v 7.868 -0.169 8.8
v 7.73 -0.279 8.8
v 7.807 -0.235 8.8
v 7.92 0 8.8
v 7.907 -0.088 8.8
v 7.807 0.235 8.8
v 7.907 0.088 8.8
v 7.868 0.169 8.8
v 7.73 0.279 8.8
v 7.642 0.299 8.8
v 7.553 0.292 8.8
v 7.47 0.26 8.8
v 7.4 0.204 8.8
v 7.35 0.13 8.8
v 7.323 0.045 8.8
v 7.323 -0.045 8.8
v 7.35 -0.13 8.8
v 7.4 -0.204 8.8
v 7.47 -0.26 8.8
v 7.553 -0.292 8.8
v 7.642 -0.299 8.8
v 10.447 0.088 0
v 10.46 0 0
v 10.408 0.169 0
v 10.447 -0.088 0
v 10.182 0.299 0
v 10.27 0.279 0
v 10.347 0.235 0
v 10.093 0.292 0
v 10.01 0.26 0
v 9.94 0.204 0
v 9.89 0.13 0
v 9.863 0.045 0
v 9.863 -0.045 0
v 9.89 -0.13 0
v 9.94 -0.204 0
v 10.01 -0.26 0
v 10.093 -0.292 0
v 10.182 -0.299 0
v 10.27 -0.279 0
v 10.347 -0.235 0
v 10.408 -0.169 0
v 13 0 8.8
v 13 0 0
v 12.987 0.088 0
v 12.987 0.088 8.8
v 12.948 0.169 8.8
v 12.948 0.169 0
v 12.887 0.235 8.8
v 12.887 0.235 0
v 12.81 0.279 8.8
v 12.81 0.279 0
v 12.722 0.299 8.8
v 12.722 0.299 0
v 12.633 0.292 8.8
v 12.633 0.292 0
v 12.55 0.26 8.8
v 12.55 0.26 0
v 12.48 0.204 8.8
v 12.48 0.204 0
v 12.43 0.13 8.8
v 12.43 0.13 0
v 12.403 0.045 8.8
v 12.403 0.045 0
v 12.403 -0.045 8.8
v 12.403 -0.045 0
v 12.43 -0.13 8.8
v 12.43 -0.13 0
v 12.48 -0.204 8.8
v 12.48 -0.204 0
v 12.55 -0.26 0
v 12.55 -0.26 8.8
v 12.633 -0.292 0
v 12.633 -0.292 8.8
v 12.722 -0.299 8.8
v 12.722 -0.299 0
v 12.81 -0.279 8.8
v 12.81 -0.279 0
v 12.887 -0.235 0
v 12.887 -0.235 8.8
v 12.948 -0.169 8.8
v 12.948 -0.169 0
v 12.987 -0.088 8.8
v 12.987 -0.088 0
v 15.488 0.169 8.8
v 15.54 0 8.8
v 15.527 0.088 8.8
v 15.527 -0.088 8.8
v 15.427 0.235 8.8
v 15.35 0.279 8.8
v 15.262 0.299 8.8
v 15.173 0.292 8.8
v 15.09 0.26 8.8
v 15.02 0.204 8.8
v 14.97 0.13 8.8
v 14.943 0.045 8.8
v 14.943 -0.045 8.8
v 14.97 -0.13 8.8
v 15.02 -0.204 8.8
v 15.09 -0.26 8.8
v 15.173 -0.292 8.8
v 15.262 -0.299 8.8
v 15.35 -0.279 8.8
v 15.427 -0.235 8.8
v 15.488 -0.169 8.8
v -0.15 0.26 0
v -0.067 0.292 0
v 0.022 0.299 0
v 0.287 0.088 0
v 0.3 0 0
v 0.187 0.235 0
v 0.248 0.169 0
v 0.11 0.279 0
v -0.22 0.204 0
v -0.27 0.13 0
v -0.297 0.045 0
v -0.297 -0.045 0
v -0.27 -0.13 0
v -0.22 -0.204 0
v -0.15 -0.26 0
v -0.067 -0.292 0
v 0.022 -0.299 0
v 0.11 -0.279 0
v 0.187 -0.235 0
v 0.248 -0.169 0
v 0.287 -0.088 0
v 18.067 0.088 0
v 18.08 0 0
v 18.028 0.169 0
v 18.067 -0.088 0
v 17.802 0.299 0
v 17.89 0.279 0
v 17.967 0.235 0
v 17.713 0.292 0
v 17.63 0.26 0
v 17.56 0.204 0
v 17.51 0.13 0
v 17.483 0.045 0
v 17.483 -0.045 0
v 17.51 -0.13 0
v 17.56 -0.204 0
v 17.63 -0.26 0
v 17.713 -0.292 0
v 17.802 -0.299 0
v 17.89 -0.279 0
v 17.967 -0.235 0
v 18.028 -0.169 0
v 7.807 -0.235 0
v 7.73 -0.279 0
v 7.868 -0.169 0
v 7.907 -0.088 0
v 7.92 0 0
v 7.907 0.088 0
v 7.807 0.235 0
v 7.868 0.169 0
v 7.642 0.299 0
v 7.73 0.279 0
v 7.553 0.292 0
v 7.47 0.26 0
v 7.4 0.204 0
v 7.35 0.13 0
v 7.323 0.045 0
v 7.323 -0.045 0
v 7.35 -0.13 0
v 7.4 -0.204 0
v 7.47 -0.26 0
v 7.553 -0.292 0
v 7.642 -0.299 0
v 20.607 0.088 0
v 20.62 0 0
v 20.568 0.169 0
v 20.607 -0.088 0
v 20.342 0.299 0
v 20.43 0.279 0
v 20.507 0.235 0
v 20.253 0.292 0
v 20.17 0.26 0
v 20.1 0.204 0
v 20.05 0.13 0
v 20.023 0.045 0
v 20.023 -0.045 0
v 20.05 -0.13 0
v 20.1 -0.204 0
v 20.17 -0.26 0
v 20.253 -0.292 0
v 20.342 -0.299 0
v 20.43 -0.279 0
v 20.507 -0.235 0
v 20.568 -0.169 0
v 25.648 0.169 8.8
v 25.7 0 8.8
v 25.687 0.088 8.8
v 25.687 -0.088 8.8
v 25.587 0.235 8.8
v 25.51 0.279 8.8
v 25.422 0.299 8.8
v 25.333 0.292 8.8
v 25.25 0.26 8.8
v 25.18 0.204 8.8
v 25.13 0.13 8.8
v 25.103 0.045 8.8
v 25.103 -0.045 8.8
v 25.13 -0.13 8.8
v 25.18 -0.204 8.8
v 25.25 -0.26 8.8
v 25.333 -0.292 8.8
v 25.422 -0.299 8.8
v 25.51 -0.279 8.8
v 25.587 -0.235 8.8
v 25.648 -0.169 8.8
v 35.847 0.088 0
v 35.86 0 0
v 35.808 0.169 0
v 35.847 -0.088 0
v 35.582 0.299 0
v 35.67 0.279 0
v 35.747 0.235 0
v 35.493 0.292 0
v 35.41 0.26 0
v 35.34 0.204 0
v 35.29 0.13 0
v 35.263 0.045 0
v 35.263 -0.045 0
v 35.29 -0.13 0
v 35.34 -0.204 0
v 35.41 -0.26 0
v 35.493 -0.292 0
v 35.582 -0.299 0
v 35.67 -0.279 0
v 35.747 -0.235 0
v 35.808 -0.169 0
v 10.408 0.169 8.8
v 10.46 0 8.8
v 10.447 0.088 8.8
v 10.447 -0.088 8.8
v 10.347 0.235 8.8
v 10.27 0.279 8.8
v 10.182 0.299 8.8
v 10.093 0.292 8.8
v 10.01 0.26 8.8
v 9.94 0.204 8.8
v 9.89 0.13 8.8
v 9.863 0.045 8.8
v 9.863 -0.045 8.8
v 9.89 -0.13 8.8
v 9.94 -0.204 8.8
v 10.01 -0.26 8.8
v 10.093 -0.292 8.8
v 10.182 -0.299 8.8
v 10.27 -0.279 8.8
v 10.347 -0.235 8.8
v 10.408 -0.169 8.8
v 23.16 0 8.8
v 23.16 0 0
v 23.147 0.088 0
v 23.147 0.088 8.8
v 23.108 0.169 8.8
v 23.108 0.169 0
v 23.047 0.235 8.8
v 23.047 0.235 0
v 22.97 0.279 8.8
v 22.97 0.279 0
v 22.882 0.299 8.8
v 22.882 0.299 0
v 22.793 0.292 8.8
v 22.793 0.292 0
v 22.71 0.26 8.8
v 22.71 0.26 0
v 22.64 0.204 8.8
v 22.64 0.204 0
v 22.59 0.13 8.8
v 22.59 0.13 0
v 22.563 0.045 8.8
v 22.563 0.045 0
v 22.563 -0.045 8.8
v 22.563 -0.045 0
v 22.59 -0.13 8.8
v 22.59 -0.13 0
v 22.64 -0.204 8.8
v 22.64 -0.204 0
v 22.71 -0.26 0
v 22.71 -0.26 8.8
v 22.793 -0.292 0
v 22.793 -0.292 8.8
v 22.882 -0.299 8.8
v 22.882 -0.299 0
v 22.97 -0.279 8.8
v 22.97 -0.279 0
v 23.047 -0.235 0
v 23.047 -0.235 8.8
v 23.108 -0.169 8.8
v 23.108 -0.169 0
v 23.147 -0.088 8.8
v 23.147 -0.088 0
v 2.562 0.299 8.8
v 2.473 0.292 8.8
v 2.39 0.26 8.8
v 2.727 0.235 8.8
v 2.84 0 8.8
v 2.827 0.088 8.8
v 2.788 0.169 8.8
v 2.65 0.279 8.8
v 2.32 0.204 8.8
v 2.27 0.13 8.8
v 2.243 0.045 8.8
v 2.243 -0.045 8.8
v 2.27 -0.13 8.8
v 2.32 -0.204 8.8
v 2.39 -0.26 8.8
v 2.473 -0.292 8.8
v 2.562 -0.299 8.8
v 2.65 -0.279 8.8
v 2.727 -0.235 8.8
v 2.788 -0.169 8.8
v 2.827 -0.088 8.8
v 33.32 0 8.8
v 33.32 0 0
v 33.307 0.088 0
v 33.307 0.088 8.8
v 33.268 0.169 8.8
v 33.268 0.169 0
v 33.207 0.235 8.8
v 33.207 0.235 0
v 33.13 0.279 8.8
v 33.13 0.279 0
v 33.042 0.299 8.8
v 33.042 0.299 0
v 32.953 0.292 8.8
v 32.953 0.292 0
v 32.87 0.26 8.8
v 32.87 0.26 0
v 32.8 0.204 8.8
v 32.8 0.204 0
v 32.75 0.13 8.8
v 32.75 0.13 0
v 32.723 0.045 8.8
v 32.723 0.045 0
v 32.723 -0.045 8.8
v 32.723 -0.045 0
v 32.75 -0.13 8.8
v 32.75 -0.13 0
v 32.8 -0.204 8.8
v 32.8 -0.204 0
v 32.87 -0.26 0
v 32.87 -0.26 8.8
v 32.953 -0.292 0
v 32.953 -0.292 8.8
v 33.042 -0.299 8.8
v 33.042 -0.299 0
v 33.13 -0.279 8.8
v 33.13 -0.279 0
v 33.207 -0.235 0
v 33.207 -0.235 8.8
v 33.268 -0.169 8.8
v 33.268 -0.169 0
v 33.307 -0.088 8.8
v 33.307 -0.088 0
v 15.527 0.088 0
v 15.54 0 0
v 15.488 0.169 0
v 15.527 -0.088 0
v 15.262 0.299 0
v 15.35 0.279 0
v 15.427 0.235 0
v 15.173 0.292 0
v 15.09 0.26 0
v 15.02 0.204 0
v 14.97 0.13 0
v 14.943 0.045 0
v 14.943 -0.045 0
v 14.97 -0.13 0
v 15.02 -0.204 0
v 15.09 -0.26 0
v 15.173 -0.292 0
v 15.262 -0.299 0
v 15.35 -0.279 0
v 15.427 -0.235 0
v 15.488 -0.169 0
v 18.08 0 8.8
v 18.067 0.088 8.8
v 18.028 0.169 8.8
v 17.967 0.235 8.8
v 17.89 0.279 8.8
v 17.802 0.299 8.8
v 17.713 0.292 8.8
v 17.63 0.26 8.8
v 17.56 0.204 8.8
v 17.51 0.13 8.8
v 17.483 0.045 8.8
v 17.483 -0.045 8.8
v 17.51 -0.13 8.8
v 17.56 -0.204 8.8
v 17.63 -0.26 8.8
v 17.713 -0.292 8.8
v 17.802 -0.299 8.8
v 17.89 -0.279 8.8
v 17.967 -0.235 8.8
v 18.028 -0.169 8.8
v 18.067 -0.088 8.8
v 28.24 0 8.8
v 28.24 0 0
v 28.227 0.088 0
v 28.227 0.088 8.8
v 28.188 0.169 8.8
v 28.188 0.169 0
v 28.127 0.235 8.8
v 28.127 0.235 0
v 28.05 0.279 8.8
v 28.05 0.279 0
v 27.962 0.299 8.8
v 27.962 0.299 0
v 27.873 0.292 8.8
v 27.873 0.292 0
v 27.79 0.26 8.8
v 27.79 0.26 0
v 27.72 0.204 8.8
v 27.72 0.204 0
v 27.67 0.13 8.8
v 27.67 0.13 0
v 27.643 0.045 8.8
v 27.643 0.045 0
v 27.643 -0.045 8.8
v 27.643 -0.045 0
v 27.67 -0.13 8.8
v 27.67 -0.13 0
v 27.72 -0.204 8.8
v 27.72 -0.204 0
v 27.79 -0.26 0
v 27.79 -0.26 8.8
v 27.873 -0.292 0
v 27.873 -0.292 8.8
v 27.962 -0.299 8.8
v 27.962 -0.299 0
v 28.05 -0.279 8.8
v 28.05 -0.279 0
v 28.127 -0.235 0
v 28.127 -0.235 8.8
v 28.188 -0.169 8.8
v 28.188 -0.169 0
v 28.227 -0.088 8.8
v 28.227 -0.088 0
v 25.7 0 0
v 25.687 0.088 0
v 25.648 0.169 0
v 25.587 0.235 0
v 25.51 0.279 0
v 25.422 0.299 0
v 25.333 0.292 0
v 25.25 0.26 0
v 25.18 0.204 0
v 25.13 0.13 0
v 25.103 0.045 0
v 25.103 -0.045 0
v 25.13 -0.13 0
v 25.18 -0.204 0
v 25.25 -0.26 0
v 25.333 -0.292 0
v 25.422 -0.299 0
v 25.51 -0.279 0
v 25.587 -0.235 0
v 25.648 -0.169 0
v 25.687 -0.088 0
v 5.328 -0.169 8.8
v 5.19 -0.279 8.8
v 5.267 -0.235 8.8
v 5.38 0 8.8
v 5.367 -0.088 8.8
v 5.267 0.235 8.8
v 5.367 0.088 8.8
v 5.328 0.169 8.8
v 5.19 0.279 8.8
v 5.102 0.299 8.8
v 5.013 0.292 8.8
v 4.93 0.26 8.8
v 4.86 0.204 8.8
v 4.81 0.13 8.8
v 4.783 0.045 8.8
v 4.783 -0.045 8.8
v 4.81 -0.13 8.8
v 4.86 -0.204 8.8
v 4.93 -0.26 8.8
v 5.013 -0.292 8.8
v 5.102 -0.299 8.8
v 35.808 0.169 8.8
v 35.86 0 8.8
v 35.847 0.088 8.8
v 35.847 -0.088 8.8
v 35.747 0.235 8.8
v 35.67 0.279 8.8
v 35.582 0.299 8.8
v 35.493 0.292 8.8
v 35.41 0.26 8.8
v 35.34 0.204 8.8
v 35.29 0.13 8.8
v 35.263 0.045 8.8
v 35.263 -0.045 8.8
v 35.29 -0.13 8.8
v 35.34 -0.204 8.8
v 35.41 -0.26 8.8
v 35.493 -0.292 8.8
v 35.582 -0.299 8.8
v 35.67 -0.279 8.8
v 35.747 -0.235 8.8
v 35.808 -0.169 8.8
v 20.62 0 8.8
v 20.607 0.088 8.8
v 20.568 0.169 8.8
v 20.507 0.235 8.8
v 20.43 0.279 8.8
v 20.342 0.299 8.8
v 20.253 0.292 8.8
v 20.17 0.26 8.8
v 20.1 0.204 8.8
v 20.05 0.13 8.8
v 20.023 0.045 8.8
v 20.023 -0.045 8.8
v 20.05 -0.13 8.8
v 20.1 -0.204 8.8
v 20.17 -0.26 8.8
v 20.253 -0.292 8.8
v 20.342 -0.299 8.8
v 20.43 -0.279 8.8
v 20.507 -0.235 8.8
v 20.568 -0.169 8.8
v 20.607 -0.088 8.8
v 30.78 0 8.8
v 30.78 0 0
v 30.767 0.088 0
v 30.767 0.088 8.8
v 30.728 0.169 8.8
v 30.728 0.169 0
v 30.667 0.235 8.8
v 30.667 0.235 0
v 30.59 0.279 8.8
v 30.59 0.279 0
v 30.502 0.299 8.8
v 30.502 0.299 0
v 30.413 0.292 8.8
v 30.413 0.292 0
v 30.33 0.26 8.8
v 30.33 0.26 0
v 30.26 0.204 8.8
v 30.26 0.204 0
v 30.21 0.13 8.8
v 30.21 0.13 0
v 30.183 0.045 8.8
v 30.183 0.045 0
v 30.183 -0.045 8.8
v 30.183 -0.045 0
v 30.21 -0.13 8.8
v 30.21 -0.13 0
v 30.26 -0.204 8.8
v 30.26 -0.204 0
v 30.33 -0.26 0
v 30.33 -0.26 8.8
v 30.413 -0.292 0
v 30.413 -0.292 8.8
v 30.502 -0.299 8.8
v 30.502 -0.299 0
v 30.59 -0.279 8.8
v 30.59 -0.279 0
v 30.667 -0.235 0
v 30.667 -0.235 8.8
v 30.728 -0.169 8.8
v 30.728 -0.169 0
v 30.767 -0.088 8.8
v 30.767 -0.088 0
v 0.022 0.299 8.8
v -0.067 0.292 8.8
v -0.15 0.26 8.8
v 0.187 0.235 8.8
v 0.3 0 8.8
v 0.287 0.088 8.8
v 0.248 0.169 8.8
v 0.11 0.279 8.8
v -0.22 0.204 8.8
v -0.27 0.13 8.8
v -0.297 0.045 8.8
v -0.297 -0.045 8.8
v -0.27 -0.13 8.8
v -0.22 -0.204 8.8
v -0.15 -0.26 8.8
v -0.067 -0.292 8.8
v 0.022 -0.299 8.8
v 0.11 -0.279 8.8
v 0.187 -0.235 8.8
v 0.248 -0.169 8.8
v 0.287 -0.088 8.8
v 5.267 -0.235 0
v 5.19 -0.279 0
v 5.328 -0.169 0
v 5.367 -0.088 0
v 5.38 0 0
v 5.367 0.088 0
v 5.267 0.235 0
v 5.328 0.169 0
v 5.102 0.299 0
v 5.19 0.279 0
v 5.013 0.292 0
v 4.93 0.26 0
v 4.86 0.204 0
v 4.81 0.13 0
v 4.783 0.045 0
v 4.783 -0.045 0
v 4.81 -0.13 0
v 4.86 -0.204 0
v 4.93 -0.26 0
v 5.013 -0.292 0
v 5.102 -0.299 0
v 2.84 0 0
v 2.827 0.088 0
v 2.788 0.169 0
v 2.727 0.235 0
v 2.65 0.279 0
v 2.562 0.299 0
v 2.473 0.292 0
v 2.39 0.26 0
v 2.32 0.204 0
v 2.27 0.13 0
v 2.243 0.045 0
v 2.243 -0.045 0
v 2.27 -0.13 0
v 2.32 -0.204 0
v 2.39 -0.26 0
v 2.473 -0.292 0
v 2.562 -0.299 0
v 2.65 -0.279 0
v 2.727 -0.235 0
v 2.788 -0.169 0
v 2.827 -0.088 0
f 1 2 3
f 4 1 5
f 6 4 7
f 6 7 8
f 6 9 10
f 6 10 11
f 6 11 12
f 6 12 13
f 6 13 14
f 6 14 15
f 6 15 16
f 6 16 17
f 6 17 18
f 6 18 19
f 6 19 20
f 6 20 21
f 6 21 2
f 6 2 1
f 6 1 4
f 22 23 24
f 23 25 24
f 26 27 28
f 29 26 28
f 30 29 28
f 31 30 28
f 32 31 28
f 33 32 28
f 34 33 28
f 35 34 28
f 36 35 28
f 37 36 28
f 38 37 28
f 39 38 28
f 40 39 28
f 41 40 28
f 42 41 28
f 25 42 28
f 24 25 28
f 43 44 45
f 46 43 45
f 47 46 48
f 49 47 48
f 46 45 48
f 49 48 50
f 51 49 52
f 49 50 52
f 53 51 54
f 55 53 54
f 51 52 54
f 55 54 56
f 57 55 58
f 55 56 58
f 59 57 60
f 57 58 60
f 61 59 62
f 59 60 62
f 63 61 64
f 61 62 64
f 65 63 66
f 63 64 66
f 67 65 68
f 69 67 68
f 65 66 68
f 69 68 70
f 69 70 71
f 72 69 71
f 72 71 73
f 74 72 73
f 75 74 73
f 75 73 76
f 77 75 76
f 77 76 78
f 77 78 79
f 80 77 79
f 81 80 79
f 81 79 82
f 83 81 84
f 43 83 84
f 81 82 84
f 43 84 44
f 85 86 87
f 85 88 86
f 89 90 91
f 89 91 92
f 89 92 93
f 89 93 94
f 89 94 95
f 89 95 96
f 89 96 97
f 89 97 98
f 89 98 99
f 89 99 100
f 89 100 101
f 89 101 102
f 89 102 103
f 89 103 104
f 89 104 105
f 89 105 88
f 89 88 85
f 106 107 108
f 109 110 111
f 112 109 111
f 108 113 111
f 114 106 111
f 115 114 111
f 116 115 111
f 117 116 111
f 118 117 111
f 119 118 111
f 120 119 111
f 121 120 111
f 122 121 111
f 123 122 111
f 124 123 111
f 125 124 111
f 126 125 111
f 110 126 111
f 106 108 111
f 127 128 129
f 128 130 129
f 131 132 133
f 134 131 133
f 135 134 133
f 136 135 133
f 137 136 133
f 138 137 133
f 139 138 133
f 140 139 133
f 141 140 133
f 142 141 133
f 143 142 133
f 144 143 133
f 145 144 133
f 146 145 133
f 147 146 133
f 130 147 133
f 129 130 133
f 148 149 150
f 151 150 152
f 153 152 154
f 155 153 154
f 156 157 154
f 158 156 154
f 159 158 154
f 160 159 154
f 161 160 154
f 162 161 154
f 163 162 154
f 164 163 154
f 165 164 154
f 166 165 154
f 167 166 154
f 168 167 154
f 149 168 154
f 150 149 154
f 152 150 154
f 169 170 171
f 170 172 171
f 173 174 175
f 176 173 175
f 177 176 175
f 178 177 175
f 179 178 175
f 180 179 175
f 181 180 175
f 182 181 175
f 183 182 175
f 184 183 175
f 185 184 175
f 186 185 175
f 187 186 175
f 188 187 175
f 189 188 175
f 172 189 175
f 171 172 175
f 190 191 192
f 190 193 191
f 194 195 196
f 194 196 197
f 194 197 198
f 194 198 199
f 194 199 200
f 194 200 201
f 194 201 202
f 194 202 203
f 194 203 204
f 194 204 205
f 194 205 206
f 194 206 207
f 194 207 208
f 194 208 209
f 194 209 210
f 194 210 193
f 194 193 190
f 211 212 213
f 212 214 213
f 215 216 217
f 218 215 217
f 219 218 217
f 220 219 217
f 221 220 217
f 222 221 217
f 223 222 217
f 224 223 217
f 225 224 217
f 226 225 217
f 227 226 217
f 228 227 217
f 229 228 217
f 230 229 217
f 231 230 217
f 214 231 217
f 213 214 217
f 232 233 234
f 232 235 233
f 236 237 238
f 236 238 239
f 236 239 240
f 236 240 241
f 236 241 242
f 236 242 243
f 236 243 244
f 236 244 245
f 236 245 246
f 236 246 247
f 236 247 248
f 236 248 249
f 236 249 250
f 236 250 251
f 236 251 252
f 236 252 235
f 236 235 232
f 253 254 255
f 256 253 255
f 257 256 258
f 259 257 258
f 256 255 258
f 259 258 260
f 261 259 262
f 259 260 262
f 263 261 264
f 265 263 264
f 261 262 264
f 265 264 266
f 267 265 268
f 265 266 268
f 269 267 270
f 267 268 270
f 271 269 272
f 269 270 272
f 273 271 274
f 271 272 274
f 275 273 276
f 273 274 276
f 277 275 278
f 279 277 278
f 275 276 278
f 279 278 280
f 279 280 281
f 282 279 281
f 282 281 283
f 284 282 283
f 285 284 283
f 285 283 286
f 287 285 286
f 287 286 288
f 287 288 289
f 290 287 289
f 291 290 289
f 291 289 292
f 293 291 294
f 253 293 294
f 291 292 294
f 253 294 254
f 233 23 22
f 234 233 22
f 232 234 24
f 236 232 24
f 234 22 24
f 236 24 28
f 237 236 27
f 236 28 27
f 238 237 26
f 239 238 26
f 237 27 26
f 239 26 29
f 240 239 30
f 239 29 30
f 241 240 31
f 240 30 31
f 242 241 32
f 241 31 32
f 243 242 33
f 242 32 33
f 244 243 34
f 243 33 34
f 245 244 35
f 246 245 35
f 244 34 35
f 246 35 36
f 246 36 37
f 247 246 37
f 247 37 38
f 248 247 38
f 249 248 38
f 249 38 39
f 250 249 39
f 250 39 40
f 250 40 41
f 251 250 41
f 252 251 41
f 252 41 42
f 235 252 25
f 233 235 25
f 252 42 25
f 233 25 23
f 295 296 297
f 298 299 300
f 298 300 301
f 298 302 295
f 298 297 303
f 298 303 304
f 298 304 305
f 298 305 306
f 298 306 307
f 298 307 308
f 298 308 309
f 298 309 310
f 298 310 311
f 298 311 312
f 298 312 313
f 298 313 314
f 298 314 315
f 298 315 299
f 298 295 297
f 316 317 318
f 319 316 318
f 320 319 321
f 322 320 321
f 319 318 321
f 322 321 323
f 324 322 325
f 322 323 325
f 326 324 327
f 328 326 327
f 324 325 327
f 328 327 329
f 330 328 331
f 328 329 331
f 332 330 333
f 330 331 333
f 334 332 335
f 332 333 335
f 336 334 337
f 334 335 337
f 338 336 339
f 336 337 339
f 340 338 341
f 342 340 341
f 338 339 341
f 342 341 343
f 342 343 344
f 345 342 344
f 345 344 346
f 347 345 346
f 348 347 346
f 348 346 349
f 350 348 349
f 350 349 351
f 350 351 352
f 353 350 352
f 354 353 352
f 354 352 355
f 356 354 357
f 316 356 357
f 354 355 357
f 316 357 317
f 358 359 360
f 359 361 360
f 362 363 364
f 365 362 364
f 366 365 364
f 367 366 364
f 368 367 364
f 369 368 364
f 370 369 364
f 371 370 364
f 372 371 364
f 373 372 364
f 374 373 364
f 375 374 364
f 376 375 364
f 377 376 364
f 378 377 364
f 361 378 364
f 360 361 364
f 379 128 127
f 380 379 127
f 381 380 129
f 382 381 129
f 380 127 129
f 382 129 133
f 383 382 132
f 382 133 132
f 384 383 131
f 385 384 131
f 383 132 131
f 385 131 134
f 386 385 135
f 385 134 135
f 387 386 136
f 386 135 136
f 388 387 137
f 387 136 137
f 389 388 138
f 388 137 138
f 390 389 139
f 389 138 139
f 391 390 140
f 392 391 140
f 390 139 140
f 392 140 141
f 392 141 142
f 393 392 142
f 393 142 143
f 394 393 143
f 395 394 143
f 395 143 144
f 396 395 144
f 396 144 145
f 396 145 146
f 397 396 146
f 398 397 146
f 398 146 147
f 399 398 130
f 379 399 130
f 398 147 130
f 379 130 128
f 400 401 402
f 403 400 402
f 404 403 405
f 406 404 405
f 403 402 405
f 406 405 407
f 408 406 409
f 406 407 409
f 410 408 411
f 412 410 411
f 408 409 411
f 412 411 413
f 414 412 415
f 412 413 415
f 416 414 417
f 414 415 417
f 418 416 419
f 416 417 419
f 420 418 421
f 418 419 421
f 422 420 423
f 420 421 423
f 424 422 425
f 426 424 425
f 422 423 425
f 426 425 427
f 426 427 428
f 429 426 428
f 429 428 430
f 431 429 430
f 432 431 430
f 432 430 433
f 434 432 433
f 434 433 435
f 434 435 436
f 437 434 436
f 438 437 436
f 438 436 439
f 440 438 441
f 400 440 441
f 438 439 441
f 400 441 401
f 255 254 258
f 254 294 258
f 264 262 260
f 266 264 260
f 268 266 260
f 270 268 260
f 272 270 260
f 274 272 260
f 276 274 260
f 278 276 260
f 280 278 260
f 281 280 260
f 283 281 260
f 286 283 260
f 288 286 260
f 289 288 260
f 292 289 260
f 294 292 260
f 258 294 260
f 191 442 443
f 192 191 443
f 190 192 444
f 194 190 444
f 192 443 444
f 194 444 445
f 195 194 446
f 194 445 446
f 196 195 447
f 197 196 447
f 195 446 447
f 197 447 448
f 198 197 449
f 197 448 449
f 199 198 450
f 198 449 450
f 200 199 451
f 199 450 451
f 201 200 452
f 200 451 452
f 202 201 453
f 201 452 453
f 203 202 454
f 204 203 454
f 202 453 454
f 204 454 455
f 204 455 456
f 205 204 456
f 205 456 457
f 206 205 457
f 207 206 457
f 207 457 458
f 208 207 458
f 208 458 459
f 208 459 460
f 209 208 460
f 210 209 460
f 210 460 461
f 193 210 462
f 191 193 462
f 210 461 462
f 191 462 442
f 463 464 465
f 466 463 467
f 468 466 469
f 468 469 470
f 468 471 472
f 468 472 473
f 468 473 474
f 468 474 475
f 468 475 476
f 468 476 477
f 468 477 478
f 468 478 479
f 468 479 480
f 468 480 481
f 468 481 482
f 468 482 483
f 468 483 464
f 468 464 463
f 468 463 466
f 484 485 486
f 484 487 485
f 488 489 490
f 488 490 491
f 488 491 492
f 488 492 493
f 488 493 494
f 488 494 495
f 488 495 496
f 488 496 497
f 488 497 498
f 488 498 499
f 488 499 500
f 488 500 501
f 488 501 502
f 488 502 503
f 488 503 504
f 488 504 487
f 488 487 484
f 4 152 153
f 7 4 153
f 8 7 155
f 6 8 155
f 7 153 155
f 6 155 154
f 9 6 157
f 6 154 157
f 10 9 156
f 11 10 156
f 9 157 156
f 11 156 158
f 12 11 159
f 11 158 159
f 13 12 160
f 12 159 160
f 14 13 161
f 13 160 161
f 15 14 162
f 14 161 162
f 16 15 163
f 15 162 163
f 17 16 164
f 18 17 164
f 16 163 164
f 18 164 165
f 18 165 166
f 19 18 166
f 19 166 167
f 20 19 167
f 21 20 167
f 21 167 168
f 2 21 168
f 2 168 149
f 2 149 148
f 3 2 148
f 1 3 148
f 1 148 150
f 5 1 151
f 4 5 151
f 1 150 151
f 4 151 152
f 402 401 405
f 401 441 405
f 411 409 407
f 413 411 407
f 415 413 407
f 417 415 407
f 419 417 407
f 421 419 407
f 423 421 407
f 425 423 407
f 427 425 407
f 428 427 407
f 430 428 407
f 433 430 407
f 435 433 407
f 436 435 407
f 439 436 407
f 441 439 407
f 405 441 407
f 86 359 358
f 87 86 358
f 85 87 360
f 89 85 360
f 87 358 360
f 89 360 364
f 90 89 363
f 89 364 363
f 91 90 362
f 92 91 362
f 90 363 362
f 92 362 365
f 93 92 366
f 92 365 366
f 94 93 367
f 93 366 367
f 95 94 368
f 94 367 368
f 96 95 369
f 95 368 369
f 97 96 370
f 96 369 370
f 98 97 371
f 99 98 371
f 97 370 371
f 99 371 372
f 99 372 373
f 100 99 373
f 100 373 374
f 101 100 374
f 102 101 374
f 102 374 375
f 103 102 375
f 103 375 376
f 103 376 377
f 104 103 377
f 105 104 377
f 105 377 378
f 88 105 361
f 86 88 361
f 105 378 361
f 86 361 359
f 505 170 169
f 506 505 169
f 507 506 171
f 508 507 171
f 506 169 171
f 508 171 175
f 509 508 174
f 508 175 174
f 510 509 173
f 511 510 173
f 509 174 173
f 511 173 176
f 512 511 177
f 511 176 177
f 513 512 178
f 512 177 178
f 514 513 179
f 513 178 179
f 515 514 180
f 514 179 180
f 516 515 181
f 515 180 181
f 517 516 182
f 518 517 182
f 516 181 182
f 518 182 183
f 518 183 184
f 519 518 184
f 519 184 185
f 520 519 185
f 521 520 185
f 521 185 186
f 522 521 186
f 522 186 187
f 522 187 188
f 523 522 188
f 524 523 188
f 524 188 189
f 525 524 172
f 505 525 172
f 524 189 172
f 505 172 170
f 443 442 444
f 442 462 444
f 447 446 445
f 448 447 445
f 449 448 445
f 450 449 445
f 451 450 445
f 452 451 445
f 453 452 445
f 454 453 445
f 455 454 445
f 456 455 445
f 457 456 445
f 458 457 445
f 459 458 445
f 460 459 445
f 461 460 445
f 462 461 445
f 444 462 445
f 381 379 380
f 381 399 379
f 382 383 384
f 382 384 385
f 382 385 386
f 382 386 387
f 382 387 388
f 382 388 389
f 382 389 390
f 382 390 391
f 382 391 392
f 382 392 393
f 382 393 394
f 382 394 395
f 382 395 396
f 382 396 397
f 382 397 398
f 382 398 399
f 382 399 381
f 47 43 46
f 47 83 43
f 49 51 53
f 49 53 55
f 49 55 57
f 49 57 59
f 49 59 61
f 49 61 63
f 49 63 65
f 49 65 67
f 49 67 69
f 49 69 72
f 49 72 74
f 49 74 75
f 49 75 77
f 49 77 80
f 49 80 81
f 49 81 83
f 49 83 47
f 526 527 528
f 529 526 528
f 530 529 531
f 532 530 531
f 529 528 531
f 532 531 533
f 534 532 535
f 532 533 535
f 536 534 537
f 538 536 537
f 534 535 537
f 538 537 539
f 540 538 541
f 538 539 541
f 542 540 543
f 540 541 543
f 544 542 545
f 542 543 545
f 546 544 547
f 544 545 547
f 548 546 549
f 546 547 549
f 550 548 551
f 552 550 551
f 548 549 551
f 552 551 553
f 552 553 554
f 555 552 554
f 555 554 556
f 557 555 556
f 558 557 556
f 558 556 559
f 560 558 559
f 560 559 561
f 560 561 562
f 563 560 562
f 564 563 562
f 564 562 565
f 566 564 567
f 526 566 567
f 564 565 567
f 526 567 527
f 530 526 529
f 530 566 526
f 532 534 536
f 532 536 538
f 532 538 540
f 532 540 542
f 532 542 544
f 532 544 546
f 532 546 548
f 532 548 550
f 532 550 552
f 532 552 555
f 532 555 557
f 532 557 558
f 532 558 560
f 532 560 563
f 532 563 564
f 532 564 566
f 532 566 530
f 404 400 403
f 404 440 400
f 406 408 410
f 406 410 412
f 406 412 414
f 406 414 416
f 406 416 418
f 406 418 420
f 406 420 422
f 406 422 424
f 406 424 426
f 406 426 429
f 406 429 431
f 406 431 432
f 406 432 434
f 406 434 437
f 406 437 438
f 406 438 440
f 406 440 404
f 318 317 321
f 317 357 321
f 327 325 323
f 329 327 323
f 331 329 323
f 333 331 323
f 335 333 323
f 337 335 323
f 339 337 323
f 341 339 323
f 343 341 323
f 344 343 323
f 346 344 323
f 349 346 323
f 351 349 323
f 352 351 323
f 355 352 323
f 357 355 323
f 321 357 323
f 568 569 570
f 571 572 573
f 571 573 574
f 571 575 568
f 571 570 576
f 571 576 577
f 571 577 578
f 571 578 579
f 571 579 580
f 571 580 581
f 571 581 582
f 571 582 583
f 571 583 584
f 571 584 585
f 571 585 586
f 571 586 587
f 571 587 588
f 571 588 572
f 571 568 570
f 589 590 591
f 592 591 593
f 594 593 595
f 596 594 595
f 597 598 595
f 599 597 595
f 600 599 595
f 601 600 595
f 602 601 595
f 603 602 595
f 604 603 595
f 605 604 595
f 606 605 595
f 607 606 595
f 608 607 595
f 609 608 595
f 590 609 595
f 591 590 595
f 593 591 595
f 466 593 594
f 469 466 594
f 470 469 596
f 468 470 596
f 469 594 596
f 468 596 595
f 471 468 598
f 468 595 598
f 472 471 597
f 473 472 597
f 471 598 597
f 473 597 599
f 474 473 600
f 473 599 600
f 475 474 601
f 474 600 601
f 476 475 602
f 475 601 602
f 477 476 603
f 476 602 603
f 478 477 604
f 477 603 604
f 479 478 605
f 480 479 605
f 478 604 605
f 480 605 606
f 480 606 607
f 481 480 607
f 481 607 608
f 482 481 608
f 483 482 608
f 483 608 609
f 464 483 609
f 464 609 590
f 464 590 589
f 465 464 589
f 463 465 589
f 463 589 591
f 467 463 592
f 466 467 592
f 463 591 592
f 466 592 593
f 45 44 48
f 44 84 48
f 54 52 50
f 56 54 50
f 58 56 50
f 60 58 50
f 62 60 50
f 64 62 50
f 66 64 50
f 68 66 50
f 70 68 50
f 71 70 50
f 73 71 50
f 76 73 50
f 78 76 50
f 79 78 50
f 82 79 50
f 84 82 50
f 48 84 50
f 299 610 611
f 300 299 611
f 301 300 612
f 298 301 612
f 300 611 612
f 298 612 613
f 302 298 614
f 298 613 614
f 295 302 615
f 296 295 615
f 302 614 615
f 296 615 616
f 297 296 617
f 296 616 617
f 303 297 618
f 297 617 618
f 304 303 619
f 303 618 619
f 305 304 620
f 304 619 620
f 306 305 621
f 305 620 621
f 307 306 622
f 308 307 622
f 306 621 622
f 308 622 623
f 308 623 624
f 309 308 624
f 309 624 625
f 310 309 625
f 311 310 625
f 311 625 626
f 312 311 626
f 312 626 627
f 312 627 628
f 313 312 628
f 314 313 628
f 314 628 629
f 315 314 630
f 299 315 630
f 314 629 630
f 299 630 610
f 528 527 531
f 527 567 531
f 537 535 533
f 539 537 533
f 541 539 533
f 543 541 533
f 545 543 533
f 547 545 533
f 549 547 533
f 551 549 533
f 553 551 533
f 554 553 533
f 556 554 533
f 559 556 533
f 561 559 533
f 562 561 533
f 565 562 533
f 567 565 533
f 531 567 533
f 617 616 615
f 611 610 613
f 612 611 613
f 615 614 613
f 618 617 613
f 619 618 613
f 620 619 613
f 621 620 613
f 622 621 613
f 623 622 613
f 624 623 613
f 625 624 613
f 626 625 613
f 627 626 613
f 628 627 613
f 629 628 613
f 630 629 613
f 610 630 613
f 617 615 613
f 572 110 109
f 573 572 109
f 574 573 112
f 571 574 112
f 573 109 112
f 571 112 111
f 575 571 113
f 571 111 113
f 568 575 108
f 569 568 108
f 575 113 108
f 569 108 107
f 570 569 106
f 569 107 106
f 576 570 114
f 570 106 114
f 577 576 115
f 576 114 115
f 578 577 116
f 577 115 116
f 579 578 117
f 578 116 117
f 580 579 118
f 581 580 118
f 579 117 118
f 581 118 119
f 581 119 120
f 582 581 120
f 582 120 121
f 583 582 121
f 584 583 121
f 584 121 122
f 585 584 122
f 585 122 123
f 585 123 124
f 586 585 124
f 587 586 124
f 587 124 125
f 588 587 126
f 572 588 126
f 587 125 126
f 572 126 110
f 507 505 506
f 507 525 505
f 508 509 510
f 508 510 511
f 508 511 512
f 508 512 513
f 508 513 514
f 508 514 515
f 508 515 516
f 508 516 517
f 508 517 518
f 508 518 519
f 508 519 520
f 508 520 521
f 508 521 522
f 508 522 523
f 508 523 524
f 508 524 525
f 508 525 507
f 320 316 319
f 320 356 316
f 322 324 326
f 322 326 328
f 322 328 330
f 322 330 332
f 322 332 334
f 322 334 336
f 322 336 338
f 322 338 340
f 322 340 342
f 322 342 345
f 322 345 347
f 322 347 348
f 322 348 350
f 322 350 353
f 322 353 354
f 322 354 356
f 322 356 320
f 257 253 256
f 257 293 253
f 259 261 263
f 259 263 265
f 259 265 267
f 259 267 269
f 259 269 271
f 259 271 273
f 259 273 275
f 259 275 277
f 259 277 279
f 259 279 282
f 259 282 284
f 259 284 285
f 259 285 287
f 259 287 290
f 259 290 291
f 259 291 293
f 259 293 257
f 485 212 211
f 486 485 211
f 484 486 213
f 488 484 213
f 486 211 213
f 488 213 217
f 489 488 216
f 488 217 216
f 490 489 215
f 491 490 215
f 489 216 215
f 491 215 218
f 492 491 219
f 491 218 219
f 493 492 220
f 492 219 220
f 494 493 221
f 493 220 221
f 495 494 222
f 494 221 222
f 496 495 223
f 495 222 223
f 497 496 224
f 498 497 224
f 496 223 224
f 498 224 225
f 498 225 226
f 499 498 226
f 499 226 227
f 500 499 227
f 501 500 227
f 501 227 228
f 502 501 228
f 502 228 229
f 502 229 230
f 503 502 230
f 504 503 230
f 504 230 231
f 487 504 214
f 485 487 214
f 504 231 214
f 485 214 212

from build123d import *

# Parameters (mm, degrees)
SKETCH_1_R         = 0.3
EXTRUDE_1_DEPTH    = 8.8
EXTRUDE_1_2_DEPTH  = 8.8
EXTRUDE_1_3_DEPTH  = 8.8
EXTRUDE_1_4_DEPTH  = 8.8
EXTRUDE_1_5_DEPTH  = 8.8
EXTRUDE_1_6_DEPTH  = 8.8
EXTRUDE_1_7_DEPTH  = 8.8
EXTRUDE_1_8_DEPTH  = 8.8
EXTRUDE_1_9_DEPTH  = 8.8
EXTRUDE_1_10_DEPTH = 8.8
EXTRUDE_1_11_DEPTH = 8.8
EXTRUDE_1_12_DEPTH = 8.8
EXTRUDE_1_13_DEPTH = 8.8
EXTRUDE_1_14_DEPTH = 8.8
EXTRUDE_1_15_DEPTH = 8.8


with BuildPart() as part:
    # Эскиз1 → Бобышка-Вытянуть1 (new body)
    with BuildSketch(Plane.XY):
        Circle(SKETCH_1_R)
    extrude(amount=EXTRUDE_1_DEPTH)


with BuildPart() as body_2:
    # Эскиз1 → Extrude 1 2 (new body)
    with BuildSketch(Plane.XY):
        with Locations((2.54, 0)):
            Circle(SKETCH_1_R)
    extrude(amount=EXTRUDE_1_2_DEPTH)


with BuildPart() as body_3:
    # Эскиз1 → Extrude 1 3 (new body)
    with BuildSketch(Plane.XY):
        with Locations((5.08, 0)):
            Circle(SKETCH_1_R)
    extrude(amount=EXTRUDE_1_3_DEPTH)


with BuildPart() as body_4:
    # Эскиз1 → Extrude 1 4 (new body)
    with BuildSketch(Plane.XY):
        with Locations((7.62, 0)):
            Circle(SKETCH_1_R)
    extrude(amount=EXTRUDE_1_4_DEPTH)


with BuildPart() as body_5:
    # Эскиз1 → Extrude 1 5 (new body)
    with BuildSketch(Plane.XY):
        with Locations((10.16, 0)):
            Circle(SKETCH_1_R)
    extrude(amount=EXTRUDE_1_5_DEPTH)


with BuildPart() as body_6:
    # Эскиз1 → Extrude 1 6 (new body)
    with BuildSketch(Plane.XY):
        with Locations((12.7, 0)):
            Circle(SKETCH_1_R)
    extrude(amount=EXTRUDE_1_6_DEPTH)


with BuildPart() as body_7:
    # Эскиз1 → Extrude 1 7 (new body)
    with BuildSketch(Plane.XY):
        with Locations((15.24, 0)):
            Circle(SKETCH_1_R)
    extrude(amount=EXTRUDE_1_7_DEPTH)


with BuildPart() as body_8:
    # Эскиз1 → Extrude 1 8 (new body)
    with BuildSketch(Plane.XY):
        with Locations((17.78, 0)):
            Circle(SKETCH_1_R)
    extrude(amount=EXTRUDE_1_8_DEPTH)


with BuildPart() as body_9:
    # Эскиз1 → Extrude 1 9 (new body)
    with BuildSketch(Plane.XY):
        with Locations((20.32, 0)):
            Circle(SKETCH_1_R)
    extrude(amount=EXTRUDE_1_9_DEPTH)


with BuildPart() as body_10:
    # Эскиз1 → Extrude 1 10 (new body)
    with BuildSketch(Plane.XY):
        with Locations((22.86, 0)):
            Circle(SKETCH_1_R)
    extrude(amount=EXTRUDE_1_10_DEPTH)


with BuildPart() as body_11:
    # Эскиз1 → Extrude 1 11 (new body)
    with BuildSketch(Plane.XY):
        with Locations((25.4, 0)):
            Circle(SKETCH_1_R)
    extrude(amount=EXTRUDE_1_11_DEPTH)


with BuildPart() as body_12:
    # Эскиз1 → Extrude 1 12 (new body)
    with BuildSketch(Plane.XY):
        with Locations((27.94, 0)):
            Circle(SKETCH_1_R)
    extrude(amount=EXTRUDE_1_12_DEPTH)


with BuildPart() as body_13:
    # Эскиз1 → Extrude 1 13 (new body)
    with BuildSketch(Plane.XY):
        with Locations((30.48, 0)):
            Circle(SKETCH_1_R)
    extrude(amount=EXTRUDE_1_13_DEPTH)


with BuildPart() as body_14:
    # Эскиз1 → Extrude 1 14 (new body)
    with BuildSketch(Plane.XY):
        with Locations((33.02, 0)):
            Circle(SKETCH_1_R)
    extrude(amount=EXTRUDE_1_14_DEPTH)


with BuildPart() as body_15:
    # Эскиз1 → Extrude 1 15 (new body)
    with BuildSketch(Plane.XY):
        with Locations((35.56, 0)):
            Circle(SKETCH_1_R)
    extrude(amount=EXTRUDE_1_15_DEPTH)


solid = Compound([part.part, body_2.part, body_3.part, body_4.part, body_5.part, body_6.part, body_7.part, body_8.part, body_9.part, body_10.part, body_11.part, body_12.part, body_13.part, body_14.part, body_15.part])
